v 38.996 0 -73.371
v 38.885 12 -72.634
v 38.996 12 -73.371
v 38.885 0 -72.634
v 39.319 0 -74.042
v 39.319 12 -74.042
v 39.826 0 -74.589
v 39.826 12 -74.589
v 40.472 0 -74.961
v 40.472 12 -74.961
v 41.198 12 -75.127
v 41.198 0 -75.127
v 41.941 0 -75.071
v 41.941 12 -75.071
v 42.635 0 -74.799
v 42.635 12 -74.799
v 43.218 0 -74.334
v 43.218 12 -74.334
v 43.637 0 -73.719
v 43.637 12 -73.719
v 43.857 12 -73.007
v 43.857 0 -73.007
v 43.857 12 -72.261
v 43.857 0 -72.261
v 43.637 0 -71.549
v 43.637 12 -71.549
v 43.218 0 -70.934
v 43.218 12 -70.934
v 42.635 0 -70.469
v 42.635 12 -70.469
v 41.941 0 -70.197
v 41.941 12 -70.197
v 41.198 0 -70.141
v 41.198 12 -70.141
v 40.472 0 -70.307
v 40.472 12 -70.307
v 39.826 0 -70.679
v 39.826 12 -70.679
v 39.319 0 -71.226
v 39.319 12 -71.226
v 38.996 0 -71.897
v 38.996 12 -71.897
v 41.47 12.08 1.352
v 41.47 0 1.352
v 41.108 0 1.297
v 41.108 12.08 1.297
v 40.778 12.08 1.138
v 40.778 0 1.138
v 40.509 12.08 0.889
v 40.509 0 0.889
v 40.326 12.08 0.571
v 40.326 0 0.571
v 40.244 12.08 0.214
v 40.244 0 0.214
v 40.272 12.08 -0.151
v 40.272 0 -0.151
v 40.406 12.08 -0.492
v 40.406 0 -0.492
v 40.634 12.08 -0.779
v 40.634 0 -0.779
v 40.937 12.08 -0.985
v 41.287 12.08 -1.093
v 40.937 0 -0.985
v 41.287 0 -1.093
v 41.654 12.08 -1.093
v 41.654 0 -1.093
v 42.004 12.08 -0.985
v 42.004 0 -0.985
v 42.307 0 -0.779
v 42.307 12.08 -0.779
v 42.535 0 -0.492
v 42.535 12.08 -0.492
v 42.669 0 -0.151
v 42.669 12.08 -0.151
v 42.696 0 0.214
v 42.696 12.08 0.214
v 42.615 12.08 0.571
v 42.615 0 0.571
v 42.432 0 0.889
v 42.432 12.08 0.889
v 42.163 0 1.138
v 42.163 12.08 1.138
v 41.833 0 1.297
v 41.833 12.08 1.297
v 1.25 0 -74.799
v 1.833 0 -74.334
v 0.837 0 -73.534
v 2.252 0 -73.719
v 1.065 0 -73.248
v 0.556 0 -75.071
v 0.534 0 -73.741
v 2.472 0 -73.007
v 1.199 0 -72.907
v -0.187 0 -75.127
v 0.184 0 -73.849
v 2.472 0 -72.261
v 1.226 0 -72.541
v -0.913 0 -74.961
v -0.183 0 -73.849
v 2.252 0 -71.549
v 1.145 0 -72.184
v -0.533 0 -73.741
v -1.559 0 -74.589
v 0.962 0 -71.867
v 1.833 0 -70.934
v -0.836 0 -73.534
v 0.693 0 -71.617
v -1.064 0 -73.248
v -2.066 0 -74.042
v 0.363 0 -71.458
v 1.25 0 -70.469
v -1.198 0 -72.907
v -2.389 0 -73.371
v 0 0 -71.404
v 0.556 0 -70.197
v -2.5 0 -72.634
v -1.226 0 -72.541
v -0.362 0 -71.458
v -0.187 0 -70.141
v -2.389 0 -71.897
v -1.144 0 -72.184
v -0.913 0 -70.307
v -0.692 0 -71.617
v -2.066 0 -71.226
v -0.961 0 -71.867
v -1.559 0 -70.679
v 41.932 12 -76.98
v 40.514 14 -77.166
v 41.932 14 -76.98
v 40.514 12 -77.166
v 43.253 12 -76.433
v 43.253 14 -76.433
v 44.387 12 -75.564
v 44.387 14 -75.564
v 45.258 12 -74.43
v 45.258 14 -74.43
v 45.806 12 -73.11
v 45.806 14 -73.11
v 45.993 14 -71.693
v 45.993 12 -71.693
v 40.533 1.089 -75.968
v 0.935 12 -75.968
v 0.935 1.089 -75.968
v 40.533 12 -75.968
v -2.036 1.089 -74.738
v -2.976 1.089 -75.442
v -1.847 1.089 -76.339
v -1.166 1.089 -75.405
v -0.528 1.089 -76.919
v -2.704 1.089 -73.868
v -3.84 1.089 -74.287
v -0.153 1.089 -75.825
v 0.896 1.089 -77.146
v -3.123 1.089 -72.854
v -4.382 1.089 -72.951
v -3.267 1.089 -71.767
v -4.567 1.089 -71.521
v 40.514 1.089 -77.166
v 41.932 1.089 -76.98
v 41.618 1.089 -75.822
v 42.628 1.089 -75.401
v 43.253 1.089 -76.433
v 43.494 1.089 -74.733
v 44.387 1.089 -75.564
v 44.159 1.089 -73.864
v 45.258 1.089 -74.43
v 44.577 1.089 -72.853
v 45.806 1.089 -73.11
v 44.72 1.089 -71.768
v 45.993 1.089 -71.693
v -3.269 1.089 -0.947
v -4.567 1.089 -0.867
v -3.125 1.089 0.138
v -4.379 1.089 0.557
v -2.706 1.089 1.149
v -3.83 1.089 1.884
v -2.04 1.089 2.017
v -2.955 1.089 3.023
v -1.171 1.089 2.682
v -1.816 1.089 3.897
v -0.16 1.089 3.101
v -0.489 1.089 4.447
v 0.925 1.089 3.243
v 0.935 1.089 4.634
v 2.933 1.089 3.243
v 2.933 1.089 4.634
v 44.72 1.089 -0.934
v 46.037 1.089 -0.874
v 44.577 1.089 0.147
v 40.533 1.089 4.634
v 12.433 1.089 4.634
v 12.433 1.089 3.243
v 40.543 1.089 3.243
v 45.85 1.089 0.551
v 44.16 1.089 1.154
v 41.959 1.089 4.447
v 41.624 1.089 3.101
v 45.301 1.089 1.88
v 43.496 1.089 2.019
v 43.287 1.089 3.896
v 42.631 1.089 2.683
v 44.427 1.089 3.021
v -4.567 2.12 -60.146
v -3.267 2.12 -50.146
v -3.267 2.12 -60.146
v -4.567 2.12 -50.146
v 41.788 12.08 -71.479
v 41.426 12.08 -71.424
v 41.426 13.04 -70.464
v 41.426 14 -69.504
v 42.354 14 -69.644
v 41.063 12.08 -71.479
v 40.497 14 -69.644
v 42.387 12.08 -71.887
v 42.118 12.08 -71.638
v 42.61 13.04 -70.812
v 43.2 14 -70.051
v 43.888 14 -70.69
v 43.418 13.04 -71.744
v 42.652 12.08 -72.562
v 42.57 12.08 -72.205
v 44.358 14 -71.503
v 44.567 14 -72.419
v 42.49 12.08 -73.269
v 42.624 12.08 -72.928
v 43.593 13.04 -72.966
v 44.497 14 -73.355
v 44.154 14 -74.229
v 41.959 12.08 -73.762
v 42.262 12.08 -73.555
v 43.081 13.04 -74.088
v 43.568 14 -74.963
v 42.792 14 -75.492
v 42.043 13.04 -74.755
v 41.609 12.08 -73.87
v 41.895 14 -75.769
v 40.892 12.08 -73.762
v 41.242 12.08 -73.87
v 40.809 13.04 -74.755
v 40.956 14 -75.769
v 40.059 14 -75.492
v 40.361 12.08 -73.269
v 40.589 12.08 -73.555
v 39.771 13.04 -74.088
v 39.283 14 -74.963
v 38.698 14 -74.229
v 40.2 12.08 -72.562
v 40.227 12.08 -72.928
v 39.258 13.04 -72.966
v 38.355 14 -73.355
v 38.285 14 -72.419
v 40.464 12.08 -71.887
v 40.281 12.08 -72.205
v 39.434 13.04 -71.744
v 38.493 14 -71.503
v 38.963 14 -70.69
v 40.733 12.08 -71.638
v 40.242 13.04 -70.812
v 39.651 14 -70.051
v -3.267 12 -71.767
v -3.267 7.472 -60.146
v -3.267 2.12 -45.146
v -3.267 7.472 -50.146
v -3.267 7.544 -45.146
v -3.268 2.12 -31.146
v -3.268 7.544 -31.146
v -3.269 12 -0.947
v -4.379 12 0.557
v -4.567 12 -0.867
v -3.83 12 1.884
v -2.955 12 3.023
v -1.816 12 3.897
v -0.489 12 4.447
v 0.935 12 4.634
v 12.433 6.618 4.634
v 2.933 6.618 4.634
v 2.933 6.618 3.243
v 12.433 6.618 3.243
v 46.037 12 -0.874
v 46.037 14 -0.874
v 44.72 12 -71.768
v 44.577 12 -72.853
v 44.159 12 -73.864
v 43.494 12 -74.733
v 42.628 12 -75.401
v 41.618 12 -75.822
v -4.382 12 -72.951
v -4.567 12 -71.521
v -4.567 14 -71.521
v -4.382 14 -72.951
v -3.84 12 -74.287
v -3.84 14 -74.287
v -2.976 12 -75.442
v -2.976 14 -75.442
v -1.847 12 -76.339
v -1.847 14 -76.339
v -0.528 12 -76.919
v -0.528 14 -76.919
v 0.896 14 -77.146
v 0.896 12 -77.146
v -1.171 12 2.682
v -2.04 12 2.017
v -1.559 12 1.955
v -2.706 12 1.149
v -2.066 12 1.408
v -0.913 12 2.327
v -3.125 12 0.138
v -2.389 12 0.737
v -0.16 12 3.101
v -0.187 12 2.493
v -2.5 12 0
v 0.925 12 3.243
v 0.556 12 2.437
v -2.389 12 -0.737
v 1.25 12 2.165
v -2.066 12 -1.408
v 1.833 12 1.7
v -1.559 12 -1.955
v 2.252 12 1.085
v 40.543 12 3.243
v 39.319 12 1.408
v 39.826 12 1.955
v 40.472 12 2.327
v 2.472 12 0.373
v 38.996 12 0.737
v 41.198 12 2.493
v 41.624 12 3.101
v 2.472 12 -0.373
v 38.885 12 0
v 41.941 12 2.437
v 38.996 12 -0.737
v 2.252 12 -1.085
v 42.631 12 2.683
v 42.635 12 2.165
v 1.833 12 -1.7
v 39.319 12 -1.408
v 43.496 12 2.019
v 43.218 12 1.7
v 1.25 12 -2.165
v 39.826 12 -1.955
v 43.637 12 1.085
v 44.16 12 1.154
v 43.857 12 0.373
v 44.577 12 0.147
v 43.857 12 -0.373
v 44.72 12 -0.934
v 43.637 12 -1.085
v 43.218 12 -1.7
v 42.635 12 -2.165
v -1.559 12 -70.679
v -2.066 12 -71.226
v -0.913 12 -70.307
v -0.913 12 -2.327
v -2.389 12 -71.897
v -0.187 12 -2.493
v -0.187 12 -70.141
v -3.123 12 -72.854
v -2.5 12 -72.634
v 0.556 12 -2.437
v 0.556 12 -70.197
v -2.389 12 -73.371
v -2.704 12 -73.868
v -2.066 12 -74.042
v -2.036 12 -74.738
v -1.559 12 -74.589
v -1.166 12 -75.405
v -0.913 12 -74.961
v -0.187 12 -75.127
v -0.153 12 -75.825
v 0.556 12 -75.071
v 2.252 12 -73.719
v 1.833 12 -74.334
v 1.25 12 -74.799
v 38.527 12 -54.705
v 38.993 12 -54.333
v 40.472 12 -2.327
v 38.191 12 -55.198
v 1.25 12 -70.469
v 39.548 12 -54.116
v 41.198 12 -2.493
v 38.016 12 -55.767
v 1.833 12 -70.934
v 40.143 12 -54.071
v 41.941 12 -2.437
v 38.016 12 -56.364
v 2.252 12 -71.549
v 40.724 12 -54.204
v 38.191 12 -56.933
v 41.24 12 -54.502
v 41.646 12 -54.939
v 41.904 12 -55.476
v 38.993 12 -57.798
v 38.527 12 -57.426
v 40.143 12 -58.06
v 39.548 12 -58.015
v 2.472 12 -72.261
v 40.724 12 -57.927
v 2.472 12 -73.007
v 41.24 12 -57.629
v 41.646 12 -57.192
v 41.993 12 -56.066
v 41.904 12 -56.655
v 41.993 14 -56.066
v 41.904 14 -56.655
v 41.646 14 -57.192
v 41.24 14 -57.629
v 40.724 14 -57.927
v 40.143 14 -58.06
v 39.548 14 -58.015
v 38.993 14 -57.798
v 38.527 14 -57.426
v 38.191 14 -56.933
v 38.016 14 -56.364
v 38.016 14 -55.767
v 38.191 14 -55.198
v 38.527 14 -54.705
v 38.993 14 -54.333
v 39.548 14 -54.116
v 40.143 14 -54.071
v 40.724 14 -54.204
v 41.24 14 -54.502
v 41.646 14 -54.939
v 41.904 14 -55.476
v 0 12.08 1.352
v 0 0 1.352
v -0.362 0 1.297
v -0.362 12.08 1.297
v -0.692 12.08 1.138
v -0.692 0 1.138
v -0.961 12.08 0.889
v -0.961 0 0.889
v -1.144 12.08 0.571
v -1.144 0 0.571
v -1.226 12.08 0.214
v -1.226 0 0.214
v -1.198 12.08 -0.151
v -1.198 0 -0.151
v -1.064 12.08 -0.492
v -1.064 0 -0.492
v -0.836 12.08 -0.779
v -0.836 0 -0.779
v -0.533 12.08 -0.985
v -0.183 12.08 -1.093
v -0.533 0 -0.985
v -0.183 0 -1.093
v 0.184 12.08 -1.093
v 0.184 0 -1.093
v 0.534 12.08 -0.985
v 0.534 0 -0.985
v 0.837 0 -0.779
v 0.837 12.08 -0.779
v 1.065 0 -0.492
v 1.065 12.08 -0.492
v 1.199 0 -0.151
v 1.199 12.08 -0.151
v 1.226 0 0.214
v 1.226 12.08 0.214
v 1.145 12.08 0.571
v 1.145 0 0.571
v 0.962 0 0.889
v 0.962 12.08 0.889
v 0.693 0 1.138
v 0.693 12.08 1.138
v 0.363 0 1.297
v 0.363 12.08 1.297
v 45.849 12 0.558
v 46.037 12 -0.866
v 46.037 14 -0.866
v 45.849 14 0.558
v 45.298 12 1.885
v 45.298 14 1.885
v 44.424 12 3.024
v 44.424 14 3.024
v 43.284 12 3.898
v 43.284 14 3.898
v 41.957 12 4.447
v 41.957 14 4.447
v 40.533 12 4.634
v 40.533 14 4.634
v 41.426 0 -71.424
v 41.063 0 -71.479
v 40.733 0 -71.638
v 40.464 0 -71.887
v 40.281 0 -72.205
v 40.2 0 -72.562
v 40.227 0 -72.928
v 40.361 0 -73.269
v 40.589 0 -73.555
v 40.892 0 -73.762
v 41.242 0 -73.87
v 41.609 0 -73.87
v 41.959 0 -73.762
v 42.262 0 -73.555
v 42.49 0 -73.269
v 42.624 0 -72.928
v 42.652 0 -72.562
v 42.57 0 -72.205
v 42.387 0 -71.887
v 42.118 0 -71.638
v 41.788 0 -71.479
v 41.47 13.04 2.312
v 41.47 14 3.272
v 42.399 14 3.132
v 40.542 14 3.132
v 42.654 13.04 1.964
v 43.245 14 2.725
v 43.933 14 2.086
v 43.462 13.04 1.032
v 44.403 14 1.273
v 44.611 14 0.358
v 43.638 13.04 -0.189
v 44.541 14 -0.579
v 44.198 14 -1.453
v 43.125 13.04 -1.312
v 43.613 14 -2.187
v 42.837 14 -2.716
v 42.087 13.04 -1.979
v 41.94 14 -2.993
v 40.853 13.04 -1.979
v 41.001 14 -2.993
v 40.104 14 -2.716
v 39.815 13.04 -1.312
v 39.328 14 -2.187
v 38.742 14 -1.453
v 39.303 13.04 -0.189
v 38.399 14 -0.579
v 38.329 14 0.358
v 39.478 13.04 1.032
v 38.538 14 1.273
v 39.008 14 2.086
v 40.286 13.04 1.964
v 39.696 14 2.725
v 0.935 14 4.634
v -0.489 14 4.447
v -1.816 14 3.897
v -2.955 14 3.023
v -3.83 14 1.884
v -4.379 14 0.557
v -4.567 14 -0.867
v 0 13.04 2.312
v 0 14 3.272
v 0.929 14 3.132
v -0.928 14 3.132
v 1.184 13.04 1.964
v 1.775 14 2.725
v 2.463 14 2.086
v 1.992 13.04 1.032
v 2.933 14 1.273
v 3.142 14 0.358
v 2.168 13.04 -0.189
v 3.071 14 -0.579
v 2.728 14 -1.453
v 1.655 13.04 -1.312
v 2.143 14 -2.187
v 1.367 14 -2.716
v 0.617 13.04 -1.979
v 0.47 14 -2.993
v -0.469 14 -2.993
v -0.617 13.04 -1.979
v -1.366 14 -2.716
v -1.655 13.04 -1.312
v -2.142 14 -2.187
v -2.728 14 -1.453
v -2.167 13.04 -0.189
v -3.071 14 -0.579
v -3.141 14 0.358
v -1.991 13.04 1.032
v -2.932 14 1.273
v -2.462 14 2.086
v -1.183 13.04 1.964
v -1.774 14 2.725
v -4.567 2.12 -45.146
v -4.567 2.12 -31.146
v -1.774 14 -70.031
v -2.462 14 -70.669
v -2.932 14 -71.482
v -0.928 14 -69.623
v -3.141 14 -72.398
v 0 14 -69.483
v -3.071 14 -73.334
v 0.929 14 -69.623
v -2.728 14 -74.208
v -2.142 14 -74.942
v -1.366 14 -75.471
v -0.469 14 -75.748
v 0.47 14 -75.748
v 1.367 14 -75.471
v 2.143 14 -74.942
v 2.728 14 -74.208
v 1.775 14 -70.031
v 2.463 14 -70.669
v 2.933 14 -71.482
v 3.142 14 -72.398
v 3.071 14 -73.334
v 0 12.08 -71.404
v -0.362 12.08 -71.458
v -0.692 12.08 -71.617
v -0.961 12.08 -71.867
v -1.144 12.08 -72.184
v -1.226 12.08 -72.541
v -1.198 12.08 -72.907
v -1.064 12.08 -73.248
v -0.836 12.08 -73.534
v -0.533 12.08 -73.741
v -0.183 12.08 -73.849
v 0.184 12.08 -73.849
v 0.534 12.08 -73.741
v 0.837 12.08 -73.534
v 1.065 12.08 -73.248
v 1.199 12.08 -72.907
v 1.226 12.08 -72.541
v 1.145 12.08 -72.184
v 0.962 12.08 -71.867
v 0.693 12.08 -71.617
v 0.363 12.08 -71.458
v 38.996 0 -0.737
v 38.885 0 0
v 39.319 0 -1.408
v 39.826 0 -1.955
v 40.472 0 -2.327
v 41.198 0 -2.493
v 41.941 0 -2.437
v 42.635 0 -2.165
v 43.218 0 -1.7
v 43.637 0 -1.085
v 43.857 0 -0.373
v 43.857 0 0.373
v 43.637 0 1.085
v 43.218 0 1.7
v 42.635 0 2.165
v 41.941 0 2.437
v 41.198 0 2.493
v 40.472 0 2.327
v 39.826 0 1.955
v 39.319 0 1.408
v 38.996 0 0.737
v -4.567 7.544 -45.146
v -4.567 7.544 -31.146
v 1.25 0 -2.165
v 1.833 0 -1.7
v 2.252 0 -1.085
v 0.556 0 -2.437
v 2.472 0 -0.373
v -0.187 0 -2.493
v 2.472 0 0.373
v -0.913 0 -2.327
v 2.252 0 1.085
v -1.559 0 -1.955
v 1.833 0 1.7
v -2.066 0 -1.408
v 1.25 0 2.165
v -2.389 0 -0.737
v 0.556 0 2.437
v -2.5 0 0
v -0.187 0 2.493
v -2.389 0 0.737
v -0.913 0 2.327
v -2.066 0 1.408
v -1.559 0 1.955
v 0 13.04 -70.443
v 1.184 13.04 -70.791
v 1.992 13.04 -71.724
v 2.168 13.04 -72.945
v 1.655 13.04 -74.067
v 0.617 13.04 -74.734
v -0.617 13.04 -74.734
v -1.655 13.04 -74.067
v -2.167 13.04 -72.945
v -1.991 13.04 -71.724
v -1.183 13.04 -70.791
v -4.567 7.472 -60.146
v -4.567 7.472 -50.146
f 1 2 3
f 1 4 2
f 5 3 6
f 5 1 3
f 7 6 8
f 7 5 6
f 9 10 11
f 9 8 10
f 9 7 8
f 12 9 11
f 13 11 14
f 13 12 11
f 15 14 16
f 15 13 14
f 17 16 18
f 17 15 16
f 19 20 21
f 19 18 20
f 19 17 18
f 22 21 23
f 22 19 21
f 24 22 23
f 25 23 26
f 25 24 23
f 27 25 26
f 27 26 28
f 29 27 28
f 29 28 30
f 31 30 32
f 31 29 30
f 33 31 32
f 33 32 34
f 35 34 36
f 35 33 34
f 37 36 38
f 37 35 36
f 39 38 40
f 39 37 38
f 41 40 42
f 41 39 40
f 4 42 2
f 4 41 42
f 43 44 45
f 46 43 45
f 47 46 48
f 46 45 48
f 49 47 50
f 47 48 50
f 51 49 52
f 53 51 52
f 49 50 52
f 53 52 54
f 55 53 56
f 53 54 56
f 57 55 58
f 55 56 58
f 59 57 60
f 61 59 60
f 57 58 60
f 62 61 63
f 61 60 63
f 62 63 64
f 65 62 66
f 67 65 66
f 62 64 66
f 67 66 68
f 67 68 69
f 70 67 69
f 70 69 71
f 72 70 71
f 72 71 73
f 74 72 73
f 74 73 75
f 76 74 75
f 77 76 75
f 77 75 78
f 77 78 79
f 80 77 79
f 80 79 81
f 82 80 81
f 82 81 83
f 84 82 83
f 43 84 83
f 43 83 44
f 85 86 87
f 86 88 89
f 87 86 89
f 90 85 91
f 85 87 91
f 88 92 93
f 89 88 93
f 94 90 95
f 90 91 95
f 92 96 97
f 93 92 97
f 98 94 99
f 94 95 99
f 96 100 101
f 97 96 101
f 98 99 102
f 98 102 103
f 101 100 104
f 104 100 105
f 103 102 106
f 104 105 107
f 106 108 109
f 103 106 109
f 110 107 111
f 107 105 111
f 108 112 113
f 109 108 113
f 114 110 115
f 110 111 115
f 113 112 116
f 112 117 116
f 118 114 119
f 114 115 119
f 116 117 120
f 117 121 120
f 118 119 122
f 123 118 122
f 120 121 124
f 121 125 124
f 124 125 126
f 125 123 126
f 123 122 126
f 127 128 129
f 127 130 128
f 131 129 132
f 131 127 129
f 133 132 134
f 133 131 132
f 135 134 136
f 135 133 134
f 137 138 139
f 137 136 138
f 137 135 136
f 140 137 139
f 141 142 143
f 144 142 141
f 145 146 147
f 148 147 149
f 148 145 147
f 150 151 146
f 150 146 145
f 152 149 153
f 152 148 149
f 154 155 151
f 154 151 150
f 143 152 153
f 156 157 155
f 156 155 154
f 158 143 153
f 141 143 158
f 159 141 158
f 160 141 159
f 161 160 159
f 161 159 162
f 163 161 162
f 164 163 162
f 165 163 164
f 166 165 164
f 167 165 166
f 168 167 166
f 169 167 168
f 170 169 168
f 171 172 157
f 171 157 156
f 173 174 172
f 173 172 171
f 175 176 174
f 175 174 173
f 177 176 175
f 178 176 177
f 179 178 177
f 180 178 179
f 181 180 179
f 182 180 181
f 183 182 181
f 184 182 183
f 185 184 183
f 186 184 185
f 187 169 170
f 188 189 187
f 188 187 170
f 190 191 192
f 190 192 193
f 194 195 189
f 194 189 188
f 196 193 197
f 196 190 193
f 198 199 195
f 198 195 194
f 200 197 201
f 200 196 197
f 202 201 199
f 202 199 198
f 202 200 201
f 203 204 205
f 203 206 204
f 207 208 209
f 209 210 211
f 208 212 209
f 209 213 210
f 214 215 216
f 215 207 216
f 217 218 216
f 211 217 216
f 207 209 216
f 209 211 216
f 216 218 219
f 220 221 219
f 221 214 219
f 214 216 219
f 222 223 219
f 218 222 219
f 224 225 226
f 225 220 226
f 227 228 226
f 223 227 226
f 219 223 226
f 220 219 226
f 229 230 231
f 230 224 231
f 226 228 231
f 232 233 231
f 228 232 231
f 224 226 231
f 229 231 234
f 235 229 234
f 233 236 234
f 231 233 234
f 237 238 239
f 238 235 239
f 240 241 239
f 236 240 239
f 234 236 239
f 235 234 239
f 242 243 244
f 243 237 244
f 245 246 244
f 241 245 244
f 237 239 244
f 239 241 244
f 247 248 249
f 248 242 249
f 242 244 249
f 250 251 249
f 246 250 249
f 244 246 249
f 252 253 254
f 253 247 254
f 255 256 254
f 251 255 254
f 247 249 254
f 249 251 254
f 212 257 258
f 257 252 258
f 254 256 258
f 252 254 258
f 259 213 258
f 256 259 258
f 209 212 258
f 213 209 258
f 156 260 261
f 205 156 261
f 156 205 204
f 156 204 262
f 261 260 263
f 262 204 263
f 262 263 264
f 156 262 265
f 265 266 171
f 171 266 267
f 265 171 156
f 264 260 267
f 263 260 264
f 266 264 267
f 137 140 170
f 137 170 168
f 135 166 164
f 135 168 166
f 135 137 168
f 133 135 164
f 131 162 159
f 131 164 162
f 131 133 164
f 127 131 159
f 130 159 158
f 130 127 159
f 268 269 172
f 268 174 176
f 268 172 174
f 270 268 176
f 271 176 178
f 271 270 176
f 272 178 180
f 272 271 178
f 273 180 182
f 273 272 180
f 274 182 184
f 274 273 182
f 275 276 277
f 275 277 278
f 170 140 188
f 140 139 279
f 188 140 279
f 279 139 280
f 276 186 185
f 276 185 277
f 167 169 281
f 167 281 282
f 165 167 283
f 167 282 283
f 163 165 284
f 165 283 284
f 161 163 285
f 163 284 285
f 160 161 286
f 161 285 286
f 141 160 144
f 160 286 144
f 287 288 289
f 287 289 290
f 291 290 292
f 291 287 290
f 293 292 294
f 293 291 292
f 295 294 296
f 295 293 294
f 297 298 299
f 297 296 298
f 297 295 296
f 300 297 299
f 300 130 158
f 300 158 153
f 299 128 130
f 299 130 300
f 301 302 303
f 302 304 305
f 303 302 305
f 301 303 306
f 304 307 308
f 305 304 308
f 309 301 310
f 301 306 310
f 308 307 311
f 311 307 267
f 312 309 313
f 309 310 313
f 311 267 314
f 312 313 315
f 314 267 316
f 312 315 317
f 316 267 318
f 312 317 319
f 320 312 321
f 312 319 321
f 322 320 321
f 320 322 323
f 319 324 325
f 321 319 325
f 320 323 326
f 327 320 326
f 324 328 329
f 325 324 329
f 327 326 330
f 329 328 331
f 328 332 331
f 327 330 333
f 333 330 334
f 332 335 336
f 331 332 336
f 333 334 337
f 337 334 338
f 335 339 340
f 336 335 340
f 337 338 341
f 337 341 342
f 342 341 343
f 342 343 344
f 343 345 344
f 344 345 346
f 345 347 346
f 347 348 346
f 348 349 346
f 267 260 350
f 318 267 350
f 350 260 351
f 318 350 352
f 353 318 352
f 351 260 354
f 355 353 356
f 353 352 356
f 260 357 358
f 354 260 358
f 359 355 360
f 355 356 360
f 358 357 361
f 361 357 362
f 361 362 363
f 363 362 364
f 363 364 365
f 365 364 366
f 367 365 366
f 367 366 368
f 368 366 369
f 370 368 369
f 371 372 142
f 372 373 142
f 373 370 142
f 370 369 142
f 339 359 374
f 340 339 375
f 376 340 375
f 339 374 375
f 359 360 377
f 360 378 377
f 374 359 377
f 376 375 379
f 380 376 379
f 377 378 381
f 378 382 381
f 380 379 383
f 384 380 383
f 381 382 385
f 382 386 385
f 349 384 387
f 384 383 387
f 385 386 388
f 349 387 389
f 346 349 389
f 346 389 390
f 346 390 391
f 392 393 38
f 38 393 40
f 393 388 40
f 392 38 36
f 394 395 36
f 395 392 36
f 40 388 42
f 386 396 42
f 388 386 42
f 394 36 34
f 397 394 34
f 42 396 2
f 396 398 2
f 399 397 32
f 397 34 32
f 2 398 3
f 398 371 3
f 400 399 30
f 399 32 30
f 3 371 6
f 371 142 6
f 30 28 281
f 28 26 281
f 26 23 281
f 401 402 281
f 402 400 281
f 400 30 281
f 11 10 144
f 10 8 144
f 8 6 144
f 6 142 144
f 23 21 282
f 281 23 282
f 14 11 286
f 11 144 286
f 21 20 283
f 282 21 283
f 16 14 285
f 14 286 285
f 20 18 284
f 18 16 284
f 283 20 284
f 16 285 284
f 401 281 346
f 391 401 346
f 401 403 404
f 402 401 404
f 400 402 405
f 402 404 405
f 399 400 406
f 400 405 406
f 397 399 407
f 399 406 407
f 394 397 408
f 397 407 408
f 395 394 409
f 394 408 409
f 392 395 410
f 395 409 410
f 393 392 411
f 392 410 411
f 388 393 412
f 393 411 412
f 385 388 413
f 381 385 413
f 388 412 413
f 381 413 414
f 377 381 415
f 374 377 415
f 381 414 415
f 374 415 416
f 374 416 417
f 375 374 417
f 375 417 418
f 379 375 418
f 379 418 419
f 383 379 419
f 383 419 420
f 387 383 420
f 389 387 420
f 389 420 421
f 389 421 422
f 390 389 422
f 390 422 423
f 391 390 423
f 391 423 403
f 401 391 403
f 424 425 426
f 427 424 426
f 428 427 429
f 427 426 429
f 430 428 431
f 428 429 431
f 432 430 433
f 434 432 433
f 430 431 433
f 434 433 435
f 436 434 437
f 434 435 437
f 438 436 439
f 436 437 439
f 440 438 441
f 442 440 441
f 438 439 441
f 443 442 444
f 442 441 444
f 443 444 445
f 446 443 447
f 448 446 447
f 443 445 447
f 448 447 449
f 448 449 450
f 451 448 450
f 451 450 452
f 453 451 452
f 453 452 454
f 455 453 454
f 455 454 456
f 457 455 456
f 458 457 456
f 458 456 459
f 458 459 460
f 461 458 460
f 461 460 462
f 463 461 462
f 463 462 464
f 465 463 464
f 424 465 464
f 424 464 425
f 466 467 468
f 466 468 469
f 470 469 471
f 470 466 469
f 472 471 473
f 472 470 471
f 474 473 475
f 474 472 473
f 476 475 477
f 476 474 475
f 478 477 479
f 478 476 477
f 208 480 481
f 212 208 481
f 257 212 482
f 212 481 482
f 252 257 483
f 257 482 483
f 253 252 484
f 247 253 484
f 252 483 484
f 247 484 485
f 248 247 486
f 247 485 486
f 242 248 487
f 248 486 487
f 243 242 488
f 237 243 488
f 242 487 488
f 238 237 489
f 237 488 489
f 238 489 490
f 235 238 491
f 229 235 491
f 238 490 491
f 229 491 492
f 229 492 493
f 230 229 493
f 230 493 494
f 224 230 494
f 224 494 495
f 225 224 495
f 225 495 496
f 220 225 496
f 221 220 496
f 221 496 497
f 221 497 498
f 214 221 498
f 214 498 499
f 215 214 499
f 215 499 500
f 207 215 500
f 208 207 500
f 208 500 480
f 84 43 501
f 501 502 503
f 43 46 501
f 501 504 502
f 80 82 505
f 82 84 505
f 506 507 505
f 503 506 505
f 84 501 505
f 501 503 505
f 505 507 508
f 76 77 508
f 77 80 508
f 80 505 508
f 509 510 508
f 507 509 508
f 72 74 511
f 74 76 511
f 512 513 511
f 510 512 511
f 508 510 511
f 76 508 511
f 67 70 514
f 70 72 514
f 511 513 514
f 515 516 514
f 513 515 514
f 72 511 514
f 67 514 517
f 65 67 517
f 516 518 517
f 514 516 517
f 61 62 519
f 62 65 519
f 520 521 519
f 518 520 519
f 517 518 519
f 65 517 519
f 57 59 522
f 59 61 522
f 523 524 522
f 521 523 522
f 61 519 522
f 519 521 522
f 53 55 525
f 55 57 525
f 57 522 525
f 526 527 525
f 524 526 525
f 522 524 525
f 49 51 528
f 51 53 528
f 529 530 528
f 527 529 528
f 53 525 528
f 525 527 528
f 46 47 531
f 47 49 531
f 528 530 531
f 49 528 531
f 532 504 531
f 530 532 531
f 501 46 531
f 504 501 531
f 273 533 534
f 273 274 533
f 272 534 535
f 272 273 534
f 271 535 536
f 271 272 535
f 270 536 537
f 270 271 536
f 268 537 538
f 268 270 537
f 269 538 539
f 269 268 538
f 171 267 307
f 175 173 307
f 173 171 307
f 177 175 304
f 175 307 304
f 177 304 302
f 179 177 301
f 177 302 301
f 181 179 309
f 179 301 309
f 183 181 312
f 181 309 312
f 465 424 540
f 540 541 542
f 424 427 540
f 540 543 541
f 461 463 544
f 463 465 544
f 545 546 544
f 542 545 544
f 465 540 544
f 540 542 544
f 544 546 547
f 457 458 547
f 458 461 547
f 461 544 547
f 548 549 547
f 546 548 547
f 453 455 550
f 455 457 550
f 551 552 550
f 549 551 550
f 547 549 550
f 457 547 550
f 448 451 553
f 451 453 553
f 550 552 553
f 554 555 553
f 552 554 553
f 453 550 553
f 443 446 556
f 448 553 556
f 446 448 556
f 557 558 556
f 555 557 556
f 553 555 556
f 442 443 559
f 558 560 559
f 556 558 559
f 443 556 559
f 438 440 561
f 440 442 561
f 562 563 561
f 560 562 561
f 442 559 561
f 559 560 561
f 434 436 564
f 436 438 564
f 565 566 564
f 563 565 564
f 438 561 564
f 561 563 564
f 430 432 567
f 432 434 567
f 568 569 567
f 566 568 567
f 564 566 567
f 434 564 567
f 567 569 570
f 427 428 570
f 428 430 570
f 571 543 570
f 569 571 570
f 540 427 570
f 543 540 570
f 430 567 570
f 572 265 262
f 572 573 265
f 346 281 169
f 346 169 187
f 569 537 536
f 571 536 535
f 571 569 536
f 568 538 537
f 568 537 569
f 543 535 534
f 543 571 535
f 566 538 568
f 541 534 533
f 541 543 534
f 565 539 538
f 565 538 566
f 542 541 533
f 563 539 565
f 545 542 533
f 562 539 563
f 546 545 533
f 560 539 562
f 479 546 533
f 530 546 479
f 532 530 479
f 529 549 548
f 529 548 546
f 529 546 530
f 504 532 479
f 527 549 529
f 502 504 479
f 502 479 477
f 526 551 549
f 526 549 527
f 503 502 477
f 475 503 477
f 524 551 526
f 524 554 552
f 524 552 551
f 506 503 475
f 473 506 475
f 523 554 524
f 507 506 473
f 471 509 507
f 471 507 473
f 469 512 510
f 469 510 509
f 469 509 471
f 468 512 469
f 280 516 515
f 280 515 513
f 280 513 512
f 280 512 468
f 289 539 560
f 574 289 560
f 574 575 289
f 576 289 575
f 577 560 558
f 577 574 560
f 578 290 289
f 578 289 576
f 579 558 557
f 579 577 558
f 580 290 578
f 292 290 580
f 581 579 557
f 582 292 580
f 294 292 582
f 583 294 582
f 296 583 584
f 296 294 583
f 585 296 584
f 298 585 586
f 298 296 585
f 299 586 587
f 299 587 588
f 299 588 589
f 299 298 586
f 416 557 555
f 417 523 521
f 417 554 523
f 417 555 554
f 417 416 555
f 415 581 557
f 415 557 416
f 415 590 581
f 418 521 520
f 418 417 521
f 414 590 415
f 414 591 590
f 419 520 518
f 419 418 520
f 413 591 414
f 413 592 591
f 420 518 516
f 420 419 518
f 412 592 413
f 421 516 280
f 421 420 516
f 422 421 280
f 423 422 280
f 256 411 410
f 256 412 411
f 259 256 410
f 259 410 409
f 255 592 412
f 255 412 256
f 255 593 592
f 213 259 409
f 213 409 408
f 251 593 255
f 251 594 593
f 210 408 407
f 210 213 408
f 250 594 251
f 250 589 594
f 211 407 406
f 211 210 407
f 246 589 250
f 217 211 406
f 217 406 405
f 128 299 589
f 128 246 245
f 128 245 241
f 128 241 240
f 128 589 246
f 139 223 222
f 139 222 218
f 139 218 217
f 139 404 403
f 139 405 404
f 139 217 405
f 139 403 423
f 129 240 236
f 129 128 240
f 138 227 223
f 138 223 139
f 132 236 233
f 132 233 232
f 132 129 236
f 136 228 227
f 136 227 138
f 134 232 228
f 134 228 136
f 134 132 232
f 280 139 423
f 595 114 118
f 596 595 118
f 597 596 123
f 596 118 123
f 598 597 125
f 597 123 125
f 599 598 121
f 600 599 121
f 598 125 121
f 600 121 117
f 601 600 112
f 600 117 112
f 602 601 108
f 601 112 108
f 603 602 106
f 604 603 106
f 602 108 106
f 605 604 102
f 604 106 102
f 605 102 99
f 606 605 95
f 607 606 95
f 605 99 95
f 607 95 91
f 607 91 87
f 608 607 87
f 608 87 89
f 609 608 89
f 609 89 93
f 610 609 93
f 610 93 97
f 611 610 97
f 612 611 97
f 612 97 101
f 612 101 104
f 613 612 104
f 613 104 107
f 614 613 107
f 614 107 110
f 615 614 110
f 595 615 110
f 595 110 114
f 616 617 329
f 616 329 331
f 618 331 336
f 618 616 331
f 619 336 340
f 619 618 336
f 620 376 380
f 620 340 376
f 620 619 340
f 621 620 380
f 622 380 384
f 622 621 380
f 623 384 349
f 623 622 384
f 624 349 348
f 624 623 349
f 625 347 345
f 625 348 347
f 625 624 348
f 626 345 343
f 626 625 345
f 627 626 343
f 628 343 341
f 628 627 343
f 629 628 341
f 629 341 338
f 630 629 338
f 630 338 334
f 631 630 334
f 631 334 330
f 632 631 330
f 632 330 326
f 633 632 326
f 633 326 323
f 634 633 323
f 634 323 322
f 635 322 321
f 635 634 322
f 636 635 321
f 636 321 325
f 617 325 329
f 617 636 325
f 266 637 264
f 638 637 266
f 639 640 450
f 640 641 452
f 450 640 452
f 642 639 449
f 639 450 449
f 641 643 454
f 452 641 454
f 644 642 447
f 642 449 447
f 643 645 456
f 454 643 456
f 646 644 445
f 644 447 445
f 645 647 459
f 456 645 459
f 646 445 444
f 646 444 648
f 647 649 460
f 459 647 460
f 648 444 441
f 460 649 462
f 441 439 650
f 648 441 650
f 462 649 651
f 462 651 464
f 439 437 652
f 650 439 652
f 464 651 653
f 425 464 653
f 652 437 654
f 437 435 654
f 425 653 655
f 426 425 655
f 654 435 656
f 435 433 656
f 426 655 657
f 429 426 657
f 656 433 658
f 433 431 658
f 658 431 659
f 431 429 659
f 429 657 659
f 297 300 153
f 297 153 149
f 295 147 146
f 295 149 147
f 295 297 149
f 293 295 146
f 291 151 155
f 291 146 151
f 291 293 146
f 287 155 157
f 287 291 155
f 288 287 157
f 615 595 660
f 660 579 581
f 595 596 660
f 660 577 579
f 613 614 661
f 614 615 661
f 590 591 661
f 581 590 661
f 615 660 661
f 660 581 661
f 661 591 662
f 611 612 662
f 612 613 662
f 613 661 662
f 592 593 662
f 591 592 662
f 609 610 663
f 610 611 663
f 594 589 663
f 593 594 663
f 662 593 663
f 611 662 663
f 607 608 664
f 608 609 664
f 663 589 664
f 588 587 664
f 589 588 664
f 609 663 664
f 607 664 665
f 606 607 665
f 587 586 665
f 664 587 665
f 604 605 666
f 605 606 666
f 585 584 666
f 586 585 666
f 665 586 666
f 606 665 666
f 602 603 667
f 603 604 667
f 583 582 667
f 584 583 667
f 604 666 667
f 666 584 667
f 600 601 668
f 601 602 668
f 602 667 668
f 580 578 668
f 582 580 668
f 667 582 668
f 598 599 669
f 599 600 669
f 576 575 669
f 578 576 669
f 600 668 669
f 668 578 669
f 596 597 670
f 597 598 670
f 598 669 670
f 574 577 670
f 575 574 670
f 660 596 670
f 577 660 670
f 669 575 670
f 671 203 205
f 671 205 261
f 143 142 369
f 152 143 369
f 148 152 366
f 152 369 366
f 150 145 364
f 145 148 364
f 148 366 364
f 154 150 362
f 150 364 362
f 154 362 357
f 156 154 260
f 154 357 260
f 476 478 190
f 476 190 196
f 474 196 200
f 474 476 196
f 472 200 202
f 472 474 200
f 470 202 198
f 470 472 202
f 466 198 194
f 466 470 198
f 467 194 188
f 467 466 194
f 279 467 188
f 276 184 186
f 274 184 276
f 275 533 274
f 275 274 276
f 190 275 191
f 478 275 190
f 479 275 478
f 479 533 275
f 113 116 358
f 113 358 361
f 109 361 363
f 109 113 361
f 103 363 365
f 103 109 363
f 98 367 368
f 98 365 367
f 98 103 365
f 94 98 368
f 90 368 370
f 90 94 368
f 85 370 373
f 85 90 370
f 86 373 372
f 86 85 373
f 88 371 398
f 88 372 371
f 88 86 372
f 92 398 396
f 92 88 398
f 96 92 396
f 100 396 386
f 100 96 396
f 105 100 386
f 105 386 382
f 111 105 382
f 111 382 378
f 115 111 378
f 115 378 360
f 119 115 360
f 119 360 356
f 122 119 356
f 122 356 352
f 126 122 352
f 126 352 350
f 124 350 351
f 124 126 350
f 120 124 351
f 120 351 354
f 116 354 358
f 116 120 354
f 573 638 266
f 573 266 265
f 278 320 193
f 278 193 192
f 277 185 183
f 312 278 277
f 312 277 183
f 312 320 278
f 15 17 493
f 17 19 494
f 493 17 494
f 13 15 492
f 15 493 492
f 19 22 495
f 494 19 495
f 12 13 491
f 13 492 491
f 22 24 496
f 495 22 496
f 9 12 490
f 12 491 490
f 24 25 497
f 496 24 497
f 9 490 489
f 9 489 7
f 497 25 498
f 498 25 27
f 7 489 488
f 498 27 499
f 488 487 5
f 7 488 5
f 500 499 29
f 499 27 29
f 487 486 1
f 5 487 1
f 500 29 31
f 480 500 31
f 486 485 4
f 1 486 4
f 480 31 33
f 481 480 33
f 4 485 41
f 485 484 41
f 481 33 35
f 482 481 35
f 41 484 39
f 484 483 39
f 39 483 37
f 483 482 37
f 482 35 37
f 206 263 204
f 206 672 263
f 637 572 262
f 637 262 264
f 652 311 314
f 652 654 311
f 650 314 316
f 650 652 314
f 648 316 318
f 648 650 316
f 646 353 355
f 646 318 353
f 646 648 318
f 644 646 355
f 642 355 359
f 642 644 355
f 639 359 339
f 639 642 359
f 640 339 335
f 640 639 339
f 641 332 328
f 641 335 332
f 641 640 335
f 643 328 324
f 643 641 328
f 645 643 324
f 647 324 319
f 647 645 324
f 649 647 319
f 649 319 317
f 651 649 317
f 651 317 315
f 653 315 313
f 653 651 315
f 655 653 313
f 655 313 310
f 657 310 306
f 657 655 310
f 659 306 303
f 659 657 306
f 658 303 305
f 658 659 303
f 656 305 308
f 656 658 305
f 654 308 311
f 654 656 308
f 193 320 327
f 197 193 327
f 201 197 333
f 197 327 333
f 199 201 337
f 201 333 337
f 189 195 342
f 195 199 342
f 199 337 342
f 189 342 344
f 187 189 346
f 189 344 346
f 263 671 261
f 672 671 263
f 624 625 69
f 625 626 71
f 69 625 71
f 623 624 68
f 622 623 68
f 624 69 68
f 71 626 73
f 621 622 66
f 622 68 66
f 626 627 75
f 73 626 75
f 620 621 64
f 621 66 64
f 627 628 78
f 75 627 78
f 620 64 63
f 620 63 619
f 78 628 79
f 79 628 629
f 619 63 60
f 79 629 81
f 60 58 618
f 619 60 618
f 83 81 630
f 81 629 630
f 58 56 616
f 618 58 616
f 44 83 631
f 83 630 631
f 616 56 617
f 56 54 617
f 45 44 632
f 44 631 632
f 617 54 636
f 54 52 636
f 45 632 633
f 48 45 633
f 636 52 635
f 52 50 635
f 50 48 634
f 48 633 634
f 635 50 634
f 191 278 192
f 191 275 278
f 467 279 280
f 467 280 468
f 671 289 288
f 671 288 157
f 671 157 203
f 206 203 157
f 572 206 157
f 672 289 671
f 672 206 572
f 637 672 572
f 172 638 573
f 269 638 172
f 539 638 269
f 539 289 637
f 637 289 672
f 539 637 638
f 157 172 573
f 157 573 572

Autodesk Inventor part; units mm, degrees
ref_plane "YZ Plane" through (0, 0, 0) normal (1, 0, 0) x (0, 1, 0)
ref_plane "XZ Plane" through (0, 0, 0) normal (0, 1, 0) x (-1, 0, 0)
ref_plane "XY Plane" through (0, 0, 0) normal (0, 0, 1) x (1, 0, 0)
sketch "Эскиз1" plane through (0, 0, 0) normal (0, 1, 0) x (-1, 0, 0)
  circle A0 centre (0, 0) radius 2.5
  circle A1 centre (0, -72.634) radius 2.5
  circle A2 centre (-41.385, 0) radius 2.5
  circle A3 centre (-41.385, -72.634) radius 2.5
  dimension "d1" = 5
  dimension "d3" = 5
  dimension "d5" = 5
  dimension "d7" = 5
extrude "Выдавливание1" add sketch "Эскиз1" along normal blind 12
sketch "Эскиз2" plane through (41.385, 12, 0) normal (0, 1, 0) x (1, 0, 0)
  arc A0 (-44.6516, 0.8672) -> (-40.4502, -3.3343) centre (-40.4502, 0.8672) ccw
  arc A1 (-40.4599, 75.8769) -> (-44.6537, 71.6872) centre (-40.462, 71.6851) ccw
  arc A2 (3.3348, 71.7001) -> (-0.8419, 75.8769) centre (-0.8419, 71.7001) ccw
  arc A3 (-0.8516, -3.3343) -> (3.3348, 0.8657) centre (-0.8652, 0.8657) ccw
  line L0 (-40.4502, -3.3343) -> (-0.8516, -3.3343)
  line L1 (3.3348, 0.8657) -> (3.3348, 71.7001)
  line L2 (-0.8419, 75.8769) -> (-40.4599, 75.8769)
  arc A4 (-45.9516, 0.8672) -> (-40.4502, -4.6343) centre (-40.4502, 0.8672) ccw
  arc A5 (4.6083, 71.6927) -> (-0.8706, 77.1655) centre (-0.8679, 71.6894) ccw
  arc A6 (-0.8516, -4.6343) -> (4.6517, 0.8657) centre (-0.8513, 0.8687) ccw
  line L3 (-45.9516, 0.8672) -> (-45.9516, 71.5214)
  line L4 (-40.4886, 77.1457) -> (-0.8706, 77.1655)
  line L5 (4.6083, 71.6927) -> (4.6517, 0.8739)
  line L6 (-0.8516, -4.6343) -> (-40.4502, -4.6343)
  line L7 (-44.6516, 0.8672) -> (-44.6537, 71.6872)
  circle A7 centre (0, 72.634) radius 1.5
  circle A8 centre (0, 72.634) radius 1.5 projected
  line L8 (4.6517, 0.8739) -> (4.6517, 0.8657)
  line L9 (-40.4886, 77.1457) -> (-24.1126, 77.1457) construction
  arc A9 (-40.4886, 77.1457) -> (-45.9516, 71.5214) centre (-40.3249, 71.5214) ccw
  point P0 (-41.385, 0)
extrude "Выдавливание2" add sketch "Эскиз2" along normal blind 2 contours L7 A1 L2 A2 L1 A3 L0 A0 | L3 A9 L4 A5 L5 L8 A6 L6 A4 | A7
sketch "Эскиз4" plane through (41.385, 12, 0) normal (0, -1, 0) x (1, 0, 0)
  arc A0 (-44.6516, -71.7668) -> (-40.4502, -75.9683) centre (-40.4502, -71.7668) ccw
  arc A1 (-40.4599, 3.2429) -> (-44.6537, -0.9468) centre (-40.462, -0.9489) ccw
  arc A2 (3.3348, -0.9339) -> (-0.8419, 3.2429) centre (-0.8419, -0.9339) ccw
  arc A3 (-0.8516, -75.9683) -> (3.3348, -71.7683) centre (-0.8652, -71.7683) ccw
  line L0 (-40.4502, -75.9683) -> (-0.8516, -75.9683)
  line L1 (3.3348, -71.7683) -> (3.3348, -0.9339)
  line L2 (-0.8419, 3.2429) -> (-40.4599, 3.2429)
  line L3 (-44.6516, -71.7668) -> (-44.6537, -0.9468)
  arc A4 (4.6517, -0.8739) -> (-0.8516, 4.6343) centre (-0.8513, -0.8687) ccw projected
  line L4 (-0.8706, -77.1655) -> (-40.4886, -77.1457) projected
  line L5 (-40.4886, -77.1457) -> (-0.8706, -77.1655)
  arc A5 (-45.9516, -71.5214) -> (-40.4886, -77.1457) centre (-40.3249, -71.5214) ccw projected
  line L6 (-45.9516, -71.5214) -> (-45.9516, -0.8739)
  line L7 (-40.4502, 4.6343) -> (-0.8516, 4.6343) projected
  line L8 (-40.4502, 4.6343) -> (-0.8516, 4.6343)
  arc A6 (4.6517, -0.8739) -> (-0.8516, 4.6343) centre (-0.8513, -0.8687) ccw
  arc A7 (-0.8706, -77.1655) -> (4.6083, -71.6927) centre (-0.8679, -71.6894) ccw projected
  line L9 (4.6083, -71.6927) -> (4.6517, -0.8739)
  arc A8 (-0.8706, -77.1655) -> (4.6083, -71.6927) centre (-0.8679, -71.6894) ccw projected
  line L10 (4.6517, -0.8739) -> (4.6083, -71.6927) projected
  arc A9 (-0.8706, -77.1655) -> (4.6083, -71.6927) centre (-0.8679, -71.6894) ccw
  arc A10 (-45.9516, -71.5214) -> (-40.4886, -77.1457) centre (-40.3249, -71.5214) ccw projected
  arc A11 (-40.4502, 4.6343) -> (-45.9516, -0.8672) centre (-40.4502, -0.8672) ccw projected
  arc A12 (-40.4502, 4.6343) -> (-45.9516, -0.8672) centre (-40.4502, -0.8672) ccw
  arc A13 (-45.9516, -71.5214) -> (-40.4886, -77.1457) centre (-40.3249, -71.5214) ccw
  arc A14 (-40.4502, 4.6343) -> (-45.9516, -0.8672) centre (-40.4502, -0.8672) ccw projected
  line L11 (-45.9516, -0.8739) -> (-45.9516, -0.8672)
  point P0 (-41.385, 0)
extrude "Выдавливание4" add sketch "Эскиз4" along normal blind 10.911
sketch "Эскиз5" plane through (-4.5666, 14, -71.5214) normal (-1, 0, 0) x (0, 0, 1)
  line L0 (11.3757, -6.5285) -> (21.3757, -6.5285)
  line L1 (21.3757, -6.5285) -> (21.3757, -11.8804)
  line L2 (21.3757, -11.8804) -> (11.3757, -11.8804)
  line L3 (11.3757, -11.8804) -> (11.3757, -6.5285)
  line L4 (-5.6243, -12.911) -> (-5.6243, 0) projected
  line L5 (26.3757, -6.4555) -> (40.3757, -6.4555)
  line L6 (40.3757, -6.4555) -> (40.3757, -11.8804)
  line L7 (40.3757, -11.8804) -> (26.3757, -11.8804)
  line L8 (26.3757, -11.8804) -> (26.3757, -6.4555)
  point P0 (71.5214, -14)
  dimension "d19" = 17
  dimension "d20" = 27
  dimension "d23" = 32
  dimension "d24" = 46
extrude "Выдавливание5" cut sketch "Эскиз5" against normal blind 10
sketch "Эскиз6" plane through (0.9348, 14, 4.6343) normal (0, 0, 1) x (1, 0, 0)
  line L0 (1.9985, -7.3816) -> (11.4985, -7.3816)
  line L1 (11.4985, -7.3816) -> (11.4985, -13.551)
  line L2 (11.4985, -13.551) -> (1.9985, -13.551)
  line L3 (1.9985, -13.551) -> (1.9985, -7.3816)
  line L4 (-5.5015, -12.911) -> (-5.5015, 0) projected
  point P0 (-0.9348, -14)
  dimension "d25" = 7.5
  dimension "d26" = 17
extrude "Выдавливание6" cut sketch "Эскиз6" against normal blind 10
sketch "Эскиз7" plane through (41.385, 14, 0) normal (0, 1, 0) x (1, 0, 0)
  line L0 (-0.8706, 77.1655) -> (-40.4886, 77.1457) projected
  line L1 (4.6083, 71.6927) -> (4.6517, 0.8739) projected
  circle A0 centre (-1.3917, 56.0655) radius 2
  point P0 (-41.385, 0)
  dimension "d31" = 4
extrude "Выдавливание7" cut sketch "Эскиз7" against normal blind 10
sketch "Эскиз8" plane through (41.385, 14, 0) normal (0, 1, 0) x (1, 0, 0)
  point P0 (-41.3846, 72.6332)
hole "Отверстие1" at (0.0004, 14, -72.6332) direction (0, -1, 0) diameter 2.459 depth 21.1198 tip angle 120 countersink diameter 6.3 countersink angle 90 thread size "M3x0.5" class "6H" standard "ISO Metric profile"
sketch "Эскиз9" plane through (41.385, 14, 0) normal (0, 1, 0) x (1, 0, 0)
  point P0 (0.0407, 72.654)
hole "Отверстие2" at (41.4257, 14, -72.654) direction (0, -1, 0) diameter 2.459 depth 21.1847 tip angle 120 countersink diameter 6.3 countersink angle 90 thread size "M3x0.5" class "6H" standard "ISO Metric profile"
sketch "Эскиз10" plane through (41.385, 14, 0) normal (0, 1, 0) x (1, 0, 0)
  point P0 (0.0853, -0.1223)
hole "Отверстие3" at (41.4703, 14, 0.1223) direction (0, -1, 0) diameter 2.459 depth 21.5662 tip angle 120 countersink diameter 6.3 countersink angle 90 thread size "M3x0.5" class "6H" standard "ISO Metric profile"
sketch "Эскиз11" plane through (41.385, 14, 0) normal (0, 1, 0) x (1, 0, 0)
  point P0 (-41.3846, -0.1223)
hole "Отверстие4" at (0.0004, 14, 0.1223) direction (0, -1, 0) diameter 2.459 depth 21.6826 tip angle 120 countersink diameter 6.3 countersink angle 90 thread size "M3x0.5" class "6H" standard "ISO Metric profile"
properties part number "Крышка" material "Пластик АБС"
